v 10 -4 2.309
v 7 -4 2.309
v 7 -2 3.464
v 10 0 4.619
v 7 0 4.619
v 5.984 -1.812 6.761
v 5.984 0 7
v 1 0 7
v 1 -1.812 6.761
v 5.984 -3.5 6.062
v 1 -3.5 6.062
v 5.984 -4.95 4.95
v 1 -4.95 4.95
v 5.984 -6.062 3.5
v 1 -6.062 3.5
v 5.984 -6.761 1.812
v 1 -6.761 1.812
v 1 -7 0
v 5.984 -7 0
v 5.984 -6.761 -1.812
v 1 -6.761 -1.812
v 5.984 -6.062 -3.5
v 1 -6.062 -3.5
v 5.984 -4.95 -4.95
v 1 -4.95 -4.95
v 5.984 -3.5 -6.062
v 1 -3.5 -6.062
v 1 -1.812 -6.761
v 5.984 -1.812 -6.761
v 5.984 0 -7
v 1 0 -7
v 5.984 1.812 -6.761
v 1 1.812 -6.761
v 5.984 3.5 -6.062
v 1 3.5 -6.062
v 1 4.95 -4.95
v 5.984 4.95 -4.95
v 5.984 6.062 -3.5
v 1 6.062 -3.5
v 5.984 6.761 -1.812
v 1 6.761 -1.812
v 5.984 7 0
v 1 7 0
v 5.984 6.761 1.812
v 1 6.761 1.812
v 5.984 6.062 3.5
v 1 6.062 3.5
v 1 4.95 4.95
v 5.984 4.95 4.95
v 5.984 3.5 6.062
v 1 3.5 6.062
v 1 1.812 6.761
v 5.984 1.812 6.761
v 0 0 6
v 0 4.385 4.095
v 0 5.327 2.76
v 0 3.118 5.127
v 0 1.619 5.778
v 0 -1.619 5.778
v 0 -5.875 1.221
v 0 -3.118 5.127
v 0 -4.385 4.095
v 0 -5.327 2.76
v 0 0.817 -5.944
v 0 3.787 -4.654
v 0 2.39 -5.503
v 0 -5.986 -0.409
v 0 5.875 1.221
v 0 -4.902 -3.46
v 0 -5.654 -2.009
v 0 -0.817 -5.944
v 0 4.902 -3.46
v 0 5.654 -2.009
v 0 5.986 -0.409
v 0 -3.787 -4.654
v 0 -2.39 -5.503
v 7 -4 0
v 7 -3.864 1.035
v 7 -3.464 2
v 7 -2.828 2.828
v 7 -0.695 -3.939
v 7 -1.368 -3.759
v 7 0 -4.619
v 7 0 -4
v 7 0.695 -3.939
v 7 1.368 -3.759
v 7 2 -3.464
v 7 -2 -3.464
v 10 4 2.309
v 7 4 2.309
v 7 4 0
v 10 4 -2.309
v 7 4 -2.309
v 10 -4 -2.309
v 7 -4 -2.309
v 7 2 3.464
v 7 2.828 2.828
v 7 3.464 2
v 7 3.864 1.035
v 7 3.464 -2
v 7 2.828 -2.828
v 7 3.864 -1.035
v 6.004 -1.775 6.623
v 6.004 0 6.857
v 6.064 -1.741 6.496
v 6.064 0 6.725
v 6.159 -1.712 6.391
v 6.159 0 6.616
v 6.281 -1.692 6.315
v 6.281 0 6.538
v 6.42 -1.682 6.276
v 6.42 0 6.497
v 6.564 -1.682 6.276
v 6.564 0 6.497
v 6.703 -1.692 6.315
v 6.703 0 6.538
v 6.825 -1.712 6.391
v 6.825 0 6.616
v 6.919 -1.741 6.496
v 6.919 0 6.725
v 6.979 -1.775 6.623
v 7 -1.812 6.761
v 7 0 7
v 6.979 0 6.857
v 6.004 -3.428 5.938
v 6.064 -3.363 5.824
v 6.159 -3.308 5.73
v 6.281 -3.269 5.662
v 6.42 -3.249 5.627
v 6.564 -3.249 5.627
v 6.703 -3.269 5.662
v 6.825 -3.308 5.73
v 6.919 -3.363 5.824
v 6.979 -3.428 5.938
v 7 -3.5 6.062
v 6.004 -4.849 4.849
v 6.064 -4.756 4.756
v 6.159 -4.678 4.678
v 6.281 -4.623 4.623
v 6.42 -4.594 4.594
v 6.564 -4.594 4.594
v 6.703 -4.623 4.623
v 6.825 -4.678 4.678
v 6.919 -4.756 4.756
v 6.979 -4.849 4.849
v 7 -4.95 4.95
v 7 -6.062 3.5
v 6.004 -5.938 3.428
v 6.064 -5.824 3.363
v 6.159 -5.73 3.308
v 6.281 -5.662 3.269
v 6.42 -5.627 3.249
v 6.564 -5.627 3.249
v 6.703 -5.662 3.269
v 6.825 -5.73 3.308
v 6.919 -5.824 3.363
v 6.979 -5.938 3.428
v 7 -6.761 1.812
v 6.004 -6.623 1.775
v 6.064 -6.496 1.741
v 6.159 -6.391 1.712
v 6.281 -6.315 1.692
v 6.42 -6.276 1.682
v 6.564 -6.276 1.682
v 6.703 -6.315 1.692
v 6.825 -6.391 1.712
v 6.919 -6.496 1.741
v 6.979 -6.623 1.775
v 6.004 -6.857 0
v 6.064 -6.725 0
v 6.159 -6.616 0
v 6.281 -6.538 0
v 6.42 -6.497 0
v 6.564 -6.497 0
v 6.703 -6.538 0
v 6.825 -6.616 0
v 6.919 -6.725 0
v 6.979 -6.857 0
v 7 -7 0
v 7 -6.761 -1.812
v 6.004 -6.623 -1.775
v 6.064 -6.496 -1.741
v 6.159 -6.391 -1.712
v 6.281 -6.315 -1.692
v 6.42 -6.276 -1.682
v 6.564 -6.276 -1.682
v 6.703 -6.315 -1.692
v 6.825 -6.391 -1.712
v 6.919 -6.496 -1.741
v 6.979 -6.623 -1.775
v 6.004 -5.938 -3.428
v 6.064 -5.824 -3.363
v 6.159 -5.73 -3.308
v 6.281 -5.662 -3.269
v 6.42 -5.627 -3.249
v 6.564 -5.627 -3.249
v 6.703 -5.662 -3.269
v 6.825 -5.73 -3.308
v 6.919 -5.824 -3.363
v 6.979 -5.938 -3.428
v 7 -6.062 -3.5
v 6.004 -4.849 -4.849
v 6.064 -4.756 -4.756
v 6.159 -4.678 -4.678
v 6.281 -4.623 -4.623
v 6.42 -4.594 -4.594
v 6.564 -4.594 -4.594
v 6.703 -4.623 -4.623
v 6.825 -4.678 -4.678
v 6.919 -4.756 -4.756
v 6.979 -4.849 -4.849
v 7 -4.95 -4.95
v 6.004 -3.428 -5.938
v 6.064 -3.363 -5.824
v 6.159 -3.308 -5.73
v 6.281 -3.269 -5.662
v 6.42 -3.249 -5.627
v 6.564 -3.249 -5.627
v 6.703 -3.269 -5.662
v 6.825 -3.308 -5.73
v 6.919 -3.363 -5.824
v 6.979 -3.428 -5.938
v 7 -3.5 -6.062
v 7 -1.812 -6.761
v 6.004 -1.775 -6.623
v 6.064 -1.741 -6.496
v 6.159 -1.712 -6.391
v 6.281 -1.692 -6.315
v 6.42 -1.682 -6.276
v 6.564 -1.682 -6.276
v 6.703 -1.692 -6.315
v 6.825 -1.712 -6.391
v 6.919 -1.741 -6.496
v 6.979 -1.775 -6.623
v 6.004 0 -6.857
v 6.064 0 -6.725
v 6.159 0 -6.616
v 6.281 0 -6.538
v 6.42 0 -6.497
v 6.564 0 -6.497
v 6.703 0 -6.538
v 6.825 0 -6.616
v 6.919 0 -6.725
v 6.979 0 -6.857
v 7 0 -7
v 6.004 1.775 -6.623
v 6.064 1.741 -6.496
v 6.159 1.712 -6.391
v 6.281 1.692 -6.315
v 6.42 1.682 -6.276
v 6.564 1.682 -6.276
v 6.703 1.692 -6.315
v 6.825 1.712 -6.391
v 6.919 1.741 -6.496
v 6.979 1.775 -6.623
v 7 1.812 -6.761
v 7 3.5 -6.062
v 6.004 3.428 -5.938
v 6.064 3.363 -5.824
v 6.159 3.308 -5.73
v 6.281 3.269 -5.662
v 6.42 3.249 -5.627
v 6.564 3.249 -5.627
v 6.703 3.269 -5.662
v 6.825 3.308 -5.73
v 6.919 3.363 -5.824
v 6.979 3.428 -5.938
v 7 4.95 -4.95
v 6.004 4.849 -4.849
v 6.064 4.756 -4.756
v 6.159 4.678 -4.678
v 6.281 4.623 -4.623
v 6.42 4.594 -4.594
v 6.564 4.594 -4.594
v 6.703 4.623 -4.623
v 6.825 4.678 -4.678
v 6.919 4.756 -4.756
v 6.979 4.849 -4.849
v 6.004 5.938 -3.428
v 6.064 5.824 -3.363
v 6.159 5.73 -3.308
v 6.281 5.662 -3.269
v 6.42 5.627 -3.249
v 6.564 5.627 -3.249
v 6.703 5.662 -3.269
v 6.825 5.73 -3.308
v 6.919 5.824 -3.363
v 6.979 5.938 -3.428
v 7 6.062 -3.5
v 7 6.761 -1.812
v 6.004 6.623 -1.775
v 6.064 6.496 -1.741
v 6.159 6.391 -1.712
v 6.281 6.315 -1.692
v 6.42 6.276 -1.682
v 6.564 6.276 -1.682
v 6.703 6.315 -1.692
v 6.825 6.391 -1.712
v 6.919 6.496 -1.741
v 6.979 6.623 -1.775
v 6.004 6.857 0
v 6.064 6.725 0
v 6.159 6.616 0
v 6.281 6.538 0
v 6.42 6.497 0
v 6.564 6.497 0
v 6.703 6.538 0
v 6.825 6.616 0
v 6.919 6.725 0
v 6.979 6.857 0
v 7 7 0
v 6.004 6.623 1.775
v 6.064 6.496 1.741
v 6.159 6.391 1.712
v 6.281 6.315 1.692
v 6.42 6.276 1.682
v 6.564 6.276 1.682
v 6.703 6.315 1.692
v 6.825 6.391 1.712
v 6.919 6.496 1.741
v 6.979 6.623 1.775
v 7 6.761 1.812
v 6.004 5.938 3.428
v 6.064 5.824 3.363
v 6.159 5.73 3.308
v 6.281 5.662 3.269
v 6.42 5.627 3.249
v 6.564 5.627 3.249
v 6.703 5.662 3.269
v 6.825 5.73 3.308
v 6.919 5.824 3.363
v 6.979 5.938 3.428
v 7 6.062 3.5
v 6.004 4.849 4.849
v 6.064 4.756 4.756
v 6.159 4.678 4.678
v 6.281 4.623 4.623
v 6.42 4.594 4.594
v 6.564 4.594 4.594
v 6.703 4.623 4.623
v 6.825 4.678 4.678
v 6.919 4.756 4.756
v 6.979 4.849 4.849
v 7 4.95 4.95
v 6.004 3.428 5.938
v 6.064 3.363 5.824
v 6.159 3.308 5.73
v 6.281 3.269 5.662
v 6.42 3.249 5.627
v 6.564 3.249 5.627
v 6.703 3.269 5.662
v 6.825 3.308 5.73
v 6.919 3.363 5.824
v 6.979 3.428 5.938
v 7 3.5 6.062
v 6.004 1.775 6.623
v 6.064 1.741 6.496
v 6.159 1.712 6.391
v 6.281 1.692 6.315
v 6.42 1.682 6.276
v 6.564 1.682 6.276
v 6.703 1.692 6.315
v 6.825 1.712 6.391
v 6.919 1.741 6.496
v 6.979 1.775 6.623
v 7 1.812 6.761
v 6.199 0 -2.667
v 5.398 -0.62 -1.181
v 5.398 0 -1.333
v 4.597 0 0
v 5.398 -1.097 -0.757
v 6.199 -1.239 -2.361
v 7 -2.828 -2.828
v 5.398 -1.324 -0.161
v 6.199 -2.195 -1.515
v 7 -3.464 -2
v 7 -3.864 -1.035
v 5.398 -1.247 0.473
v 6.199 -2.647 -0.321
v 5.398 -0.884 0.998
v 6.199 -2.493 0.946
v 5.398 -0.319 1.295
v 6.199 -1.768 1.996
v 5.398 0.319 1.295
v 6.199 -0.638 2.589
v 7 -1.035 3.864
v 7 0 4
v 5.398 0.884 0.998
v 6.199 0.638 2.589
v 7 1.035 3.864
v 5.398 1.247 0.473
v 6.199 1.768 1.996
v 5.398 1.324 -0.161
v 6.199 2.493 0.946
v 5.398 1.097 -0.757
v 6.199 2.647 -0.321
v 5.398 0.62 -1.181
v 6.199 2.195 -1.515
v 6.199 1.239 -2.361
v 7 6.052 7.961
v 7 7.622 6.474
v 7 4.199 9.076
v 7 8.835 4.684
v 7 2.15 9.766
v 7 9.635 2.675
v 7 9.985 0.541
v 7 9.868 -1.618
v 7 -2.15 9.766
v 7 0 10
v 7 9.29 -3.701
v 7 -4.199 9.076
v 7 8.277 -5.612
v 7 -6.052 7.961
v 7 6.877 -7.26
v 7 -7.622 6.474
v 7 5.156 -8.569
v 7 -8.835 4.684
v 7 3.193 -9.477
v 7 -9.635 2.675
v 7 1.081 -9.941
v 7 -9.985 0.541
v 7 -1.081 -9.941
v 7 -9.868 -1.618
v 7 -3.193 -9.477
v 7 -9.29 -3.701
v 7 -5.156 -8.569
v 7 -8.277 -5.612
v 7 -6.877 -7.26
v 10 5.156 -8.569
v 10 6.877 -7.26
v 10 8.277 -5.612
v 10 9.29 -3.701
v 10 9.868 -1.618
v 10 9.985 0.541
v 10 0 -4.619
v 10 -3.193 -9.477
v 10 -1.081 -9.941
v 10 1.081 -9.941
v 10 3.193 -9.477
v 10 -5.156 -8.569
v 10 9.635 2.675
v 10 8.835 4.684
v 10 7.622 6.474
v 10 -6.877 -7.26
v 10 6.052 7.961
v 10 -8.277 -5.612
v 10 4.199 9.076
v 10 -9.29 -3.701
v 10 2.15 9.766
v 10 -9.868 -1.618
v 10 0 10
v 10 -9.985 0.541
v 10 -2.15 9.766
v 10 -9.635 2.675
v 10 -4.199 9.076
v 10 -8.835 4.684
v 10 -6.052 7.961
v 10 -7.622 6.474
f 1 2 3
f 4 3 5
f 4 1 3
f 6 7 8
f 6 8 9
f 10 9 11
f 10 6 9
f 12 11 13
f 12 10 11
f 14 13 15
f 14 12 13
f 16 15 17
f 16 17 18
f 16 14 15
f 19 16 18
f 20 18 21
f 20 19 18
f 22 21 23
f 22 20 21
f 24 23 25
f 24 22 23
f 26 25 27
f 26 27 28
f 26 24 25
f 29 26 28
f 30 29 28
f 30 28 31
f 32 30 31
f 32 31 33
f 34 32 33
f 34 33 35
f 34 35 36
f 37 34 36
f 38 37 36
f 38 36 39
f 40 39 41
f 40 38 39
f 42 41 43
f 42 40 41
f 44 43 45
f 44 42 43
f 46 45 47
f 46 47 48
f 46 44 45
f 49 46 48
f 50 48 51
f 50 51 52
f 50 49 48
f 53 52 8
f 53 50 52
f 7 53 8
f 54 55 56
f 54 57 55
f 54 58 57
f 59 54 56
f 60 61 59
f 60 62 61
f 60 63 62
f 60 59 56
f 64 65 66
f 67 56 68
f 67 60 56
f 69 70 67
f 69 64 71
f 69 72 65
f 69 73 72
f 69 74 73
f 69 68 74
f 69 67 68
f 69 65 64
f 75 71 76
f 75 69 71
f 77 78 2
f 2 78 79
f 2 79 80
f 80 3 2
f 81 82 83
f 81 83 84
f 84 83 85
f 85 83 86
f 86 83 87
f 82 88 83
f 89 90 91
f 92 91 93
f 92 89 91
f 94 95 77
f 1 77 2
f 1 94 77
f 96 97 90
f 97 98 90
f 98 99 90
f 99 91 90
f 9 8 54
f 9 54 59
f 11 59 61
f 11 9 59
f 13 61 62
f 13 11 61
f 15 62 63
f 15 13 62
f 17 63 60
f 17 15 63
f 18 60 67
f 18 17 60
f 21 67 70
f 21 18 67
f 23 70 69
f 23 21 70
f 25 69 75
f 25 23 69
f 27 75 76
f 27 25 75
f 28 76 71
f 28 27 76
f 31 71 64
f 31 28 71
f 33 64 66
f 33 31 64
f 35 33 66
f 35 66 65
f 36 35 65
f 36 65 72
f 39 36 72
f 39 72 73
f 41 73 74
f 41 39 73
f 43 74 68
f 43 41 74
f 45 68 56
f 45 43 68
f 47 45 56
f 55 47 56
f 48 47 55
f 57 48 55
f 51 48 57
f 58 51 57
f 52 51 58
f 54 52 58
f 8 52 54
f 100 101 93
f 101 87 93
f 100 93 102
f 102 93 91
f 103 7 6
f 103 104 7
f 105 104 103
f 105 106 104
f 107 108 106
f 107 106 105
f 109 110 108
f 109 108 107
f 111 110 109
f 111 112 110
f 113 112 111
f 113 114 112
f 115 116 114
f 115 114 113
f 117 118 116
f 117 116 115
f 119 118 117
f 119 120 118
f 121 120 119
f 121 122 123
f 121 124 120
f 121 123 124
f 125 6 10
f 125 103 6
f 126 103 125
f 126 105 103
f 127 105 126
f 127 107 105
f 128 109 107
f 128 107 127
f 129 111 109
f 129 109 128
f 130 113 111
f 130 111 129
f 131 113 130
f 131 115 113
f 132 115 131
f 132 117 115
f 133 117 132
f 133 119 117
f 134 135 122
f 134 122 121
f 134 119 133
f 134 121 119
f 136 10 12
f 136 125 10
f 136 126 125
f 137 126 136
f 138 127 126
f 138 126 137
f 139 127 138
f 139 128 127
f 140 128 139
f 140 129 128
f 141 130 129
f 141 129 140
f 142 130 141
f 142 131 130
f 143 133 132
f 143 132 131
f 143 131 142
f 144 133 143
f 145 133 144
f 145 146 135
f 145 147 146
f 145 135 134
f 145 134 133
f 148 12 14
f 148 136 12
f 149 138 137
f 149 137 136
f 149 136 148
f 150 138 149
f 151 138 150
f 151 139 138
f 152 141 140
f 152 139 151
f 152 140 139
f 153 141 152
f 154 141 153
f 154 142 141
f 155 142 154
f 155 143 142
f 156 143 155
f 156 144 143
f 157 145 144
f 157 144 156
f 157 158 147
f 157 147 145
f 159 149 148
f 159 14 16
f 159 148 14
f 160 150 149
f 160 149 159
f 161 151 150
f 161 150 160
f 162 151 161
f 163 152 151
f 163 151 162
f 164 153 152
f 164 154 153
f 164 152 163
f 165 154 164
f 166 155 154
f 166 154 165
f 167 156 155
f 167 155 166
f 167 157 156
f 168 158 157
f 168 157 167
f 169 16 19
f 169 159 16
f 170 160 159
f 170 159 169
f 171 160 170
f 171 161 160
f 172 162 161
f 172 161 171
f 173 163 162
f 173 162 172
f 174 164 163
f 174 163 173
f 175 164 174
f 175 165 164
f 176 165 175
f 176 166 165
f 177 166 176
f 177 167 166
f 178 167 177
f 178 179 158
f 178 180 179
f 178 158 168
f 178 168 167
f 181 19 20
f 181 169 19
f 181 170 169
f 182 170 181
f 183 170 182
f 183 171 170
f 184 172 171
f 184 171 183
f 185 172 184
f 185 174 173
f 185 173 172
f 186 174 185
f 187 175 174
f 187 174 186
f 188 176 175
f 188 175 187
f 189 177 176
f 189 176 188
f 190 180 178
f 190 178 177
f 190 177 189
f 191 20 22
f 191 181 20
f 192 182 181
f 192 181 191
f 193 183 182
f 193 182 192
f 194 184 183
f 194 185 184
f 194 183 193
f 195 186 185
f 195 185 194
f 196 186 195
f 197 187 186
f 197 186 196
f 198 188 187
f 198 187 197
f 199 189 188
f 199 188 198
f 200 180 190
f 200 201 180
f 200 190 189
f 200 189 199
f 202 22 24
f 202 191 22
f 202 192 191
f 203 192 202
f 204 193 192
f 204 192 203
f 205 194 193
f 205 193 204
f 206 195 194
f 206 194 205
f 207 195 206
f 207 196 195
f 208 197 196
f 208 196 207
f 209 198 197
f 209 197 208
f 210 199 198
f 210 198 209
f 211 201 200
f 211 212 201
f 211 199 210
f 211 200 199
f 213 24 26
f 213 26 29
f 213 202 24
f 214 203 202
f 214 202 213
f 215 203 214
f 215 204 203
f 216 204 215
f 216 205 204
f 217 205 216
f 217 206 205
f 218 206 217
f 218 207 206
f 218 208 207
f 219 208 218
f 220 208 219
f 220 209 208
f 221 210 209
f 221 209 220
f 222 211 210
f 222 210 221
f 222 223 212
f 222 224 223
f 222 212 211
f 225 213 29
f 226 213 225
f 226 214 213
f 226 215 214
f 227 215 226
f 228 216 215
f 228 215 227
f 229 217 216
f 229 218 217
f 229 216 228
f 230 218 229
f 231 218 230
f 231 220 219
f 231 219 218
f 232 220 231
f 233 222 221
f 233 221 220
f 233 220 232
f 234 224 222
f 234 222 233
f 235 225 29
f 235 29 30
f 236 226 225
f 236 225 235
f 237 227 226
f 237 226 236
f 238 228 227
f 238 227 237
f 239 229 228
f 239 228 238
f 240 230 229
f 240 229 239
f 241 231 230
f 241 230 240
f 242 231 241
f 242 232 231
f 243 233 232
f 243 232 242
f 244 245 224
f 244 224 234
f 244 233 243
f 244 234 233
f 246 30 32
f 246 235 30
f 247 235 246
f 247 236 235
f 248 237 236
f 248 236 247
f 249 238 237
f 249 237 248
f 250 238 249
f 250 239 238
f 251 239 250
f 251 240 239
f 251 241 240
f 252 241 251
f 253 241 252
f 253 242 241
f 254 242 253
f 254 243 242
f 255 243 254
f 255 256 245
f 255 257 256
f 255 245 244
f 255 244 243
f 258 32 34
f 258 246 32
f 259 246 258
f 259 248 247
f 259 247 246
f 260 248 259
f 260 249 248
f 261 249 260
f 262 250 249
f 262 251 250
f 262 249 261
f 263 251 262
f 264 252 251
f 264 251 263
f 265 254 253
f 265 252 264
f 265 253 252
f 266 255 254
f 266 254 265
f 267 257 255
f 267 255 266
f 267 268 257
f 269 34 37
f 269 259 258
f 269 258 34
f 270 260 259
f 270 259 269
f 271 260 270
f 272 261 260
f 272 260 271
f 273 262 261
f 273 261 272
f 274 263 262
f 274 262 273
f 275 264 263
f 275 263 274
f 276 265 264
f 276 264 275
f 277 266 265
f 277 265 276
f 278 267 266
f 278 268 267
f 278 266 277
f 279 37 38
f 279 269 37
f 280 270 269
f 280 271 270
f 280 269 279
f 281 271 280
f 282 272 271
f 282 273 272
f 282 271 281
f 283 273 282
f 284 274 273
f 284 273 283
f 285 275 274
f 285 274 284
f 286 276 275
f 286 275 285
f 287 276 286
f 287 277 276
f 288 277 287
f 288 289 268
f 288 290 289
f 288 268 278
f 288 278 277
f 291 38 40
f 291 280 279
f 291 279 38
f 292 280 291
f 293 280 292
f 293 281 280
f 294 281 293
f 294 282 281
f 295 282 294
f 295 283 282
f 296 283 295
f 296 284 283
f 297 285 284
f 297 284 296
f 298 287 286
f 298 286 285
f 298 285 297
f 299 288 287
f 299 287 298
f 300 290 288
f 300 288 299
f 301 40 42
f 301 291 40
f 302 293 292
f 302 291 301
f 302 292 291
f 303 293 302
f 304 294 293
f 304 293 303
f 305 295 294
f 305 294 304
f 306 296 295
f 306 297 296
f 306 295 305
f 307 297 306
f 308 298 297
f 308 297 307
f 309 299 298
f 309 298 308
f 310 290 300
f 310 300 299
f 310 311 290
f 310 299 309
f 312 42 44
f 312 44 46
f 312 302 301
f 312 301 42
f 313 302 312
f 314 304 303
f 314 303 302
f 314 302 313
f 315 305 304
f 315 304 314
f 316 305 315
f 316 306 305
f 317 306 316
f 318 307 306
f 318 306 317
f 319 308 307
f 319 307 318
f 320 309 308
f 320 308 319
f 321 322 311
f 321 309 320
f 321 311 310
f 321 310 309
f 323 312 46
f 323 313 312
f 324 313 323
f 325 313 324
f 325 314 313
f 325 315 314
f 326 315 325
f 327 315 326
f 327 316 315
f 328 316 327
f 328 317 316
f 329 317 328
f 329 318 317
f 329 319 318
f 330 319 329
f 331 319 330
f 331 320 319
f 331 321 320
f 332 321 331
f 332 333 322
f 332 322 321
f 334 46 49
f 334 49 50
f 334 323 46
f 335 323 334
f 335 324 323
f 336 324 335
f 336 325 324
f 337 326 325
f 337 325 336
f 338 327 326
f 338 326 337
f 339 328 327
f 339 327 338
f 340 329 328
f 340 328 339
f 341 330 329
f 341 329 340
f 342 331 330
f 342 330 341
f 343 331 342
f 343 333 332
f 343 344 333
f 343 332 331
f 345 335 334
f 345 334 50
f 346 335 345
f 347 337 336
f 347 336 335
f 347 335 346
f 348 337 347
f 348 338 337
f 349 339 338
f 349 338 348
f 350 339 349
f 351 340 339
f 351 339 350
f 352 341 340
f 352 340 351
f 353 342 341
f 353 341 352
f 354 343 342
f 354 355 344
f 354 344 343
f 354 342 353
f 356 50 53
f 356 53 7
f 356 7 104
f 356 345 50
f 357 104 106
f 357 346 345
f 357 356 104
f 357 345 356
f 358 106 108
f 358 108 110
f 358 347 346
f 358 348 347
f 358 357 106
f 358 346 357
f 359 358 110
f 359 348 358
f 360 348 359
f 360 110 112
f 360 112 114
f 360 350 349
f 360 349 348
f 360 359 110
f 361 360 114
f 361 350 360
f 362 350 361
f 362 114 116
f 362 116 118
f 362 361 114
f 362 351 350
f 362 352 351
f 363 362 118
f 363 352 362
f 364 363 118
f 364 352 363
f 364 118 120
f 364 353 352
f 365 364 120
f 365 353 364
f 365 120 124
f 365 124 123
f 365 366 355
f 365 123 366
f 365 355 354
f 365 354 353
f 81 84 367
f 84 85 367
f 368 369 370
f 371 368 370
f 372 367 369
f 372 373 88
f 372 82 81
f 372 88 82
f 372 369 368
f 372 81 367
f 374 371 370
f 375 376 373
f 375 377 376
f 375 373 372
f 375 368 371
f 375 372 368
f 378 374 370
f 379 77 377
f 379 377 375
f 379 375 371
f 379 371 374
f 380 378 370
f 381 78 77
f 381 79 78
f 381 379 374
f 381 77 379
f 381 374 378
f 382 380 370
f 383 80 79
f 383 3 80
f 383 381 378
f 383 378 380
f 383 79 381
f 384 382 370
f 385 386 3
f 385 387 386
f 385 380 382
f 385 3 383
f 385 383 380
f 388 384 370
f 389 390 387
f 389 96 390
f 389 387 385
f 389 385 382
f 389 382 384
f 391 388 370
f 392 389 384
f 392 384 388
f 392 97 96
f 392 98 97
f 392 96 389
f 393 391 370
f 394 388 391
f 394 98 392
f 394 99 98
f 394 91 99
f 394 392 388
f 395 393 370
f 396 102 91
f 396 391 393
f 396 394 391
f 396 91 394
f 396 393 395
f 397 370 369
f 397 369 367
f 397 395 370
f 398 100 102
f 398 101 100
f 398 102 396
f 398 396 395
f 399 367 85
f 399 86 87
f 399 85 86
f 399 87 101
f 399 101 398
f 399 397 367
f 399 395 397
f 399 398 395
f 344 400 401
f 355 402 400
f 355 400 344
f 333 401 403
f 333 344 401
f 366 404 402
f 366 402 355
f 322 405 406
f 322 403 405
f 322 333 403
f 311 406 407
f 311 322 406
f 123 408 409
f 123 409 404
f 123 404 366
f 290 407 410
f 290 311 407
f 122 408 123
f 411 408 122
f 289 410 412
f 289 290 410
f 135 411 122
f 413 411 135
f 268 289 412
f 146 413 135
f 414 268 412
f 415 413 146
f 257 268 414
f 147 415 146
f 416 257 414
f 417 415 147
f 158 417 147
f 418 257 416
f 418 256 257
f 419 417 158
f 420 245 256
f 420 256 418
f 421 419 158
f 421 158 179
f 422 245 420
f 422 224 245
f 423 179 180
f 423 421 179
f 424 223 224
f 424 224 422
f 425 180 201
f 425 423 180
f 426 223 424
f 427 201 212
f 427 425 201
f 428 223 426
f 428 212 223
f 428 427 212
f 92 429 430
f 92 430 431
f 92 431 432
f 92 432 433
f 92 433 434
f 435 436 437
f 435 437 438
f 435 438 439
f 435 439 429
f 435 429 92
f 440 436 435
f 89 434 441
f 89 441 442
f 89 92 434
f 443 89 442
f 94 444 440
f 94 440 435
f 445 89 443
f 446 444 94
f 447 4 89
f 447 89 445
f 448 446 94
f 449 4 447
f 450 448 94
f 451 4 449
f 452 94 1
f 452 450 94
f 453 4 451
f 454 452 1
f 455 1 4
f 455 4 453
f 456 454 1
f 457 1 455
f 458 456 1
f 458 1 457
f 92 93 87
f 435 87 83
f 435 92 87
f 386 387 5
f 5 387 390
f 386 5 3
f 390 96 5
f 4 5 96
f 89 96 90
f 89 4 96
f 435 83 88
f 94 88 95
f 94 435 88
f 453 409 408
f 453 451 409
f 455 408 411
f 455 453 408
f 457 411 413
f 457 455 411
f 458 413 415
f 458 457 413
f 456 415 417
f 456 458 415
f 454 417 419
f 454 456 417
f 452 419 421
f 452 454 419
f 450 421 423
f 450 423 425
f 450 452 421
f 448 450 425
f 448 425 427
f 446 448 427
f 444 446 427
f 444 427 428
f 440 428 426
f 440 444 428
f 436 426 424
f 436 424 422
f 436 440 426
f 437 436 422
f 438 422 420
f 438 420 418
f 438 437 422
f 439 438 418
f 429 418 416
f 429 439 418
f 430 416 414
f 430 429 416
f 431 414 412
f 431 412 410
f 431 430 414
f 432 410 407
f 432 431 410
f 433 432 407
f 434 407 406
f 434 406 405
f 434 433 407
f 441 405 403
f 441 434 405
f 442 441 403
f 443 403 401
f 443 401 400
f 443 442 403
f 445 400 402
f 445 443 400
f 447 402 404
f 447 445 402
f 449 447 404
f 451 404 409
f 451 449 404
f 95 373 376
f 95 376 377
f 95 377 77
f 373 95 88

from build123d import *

# Parameters (mm, degrees)
ENL_V_MAT_EXTRU_1_DEPTH = 3
CHANFREIN1_SIZE         = 1


with BuildPart() as part:
    # Esquisse1 → Révolution1 (revolve)
    with BuildSketch(Plane.XY, mode=Mode.PRIVATE) as r_volution1_sk:
        with BuildLine():
            Line((0, 0), (0, 7))
            Line((0, 7), (5.983785808, 7))
            ThreePointArc((5.983785808, 7), (6.491892904, 6.491892904), (7, 7))
            Line((7, 7), (7, 10))
            Line((7, 10), (10, 10))
            Line((10, 10), (10, 0))
            Line((10, 0), (0, 0))
        make_face()
    revolve(r_volution1_sk.sketch.rotate(Axis((0, 0, 0), (1, 0, 0)), 90), axis=Axis((0, 0, 0), (1, 0, 0)))

    # Esquisse5 → Diamètre du perçage Ø8.0 (8)1 (revolve, cut)
    with BuildSketch(Plane(origin=(10, 0, 0), x_dir=(0, 0, -1), z_dir=(0, 1, 0))):
        Polygon((0, 0), (0, 5.403442476), (4, 3), (4, 0), align=None)
    revolve(axis=Axis((16.35, 0, 0), (-1, 0, 0)), mode=Mode.SUBTRACT)

    # Esquisse3 → Enlèv. mat.-Extru.1 (cut)
    with BuildSketch(Plane(origin=(10, 0, 0), x_dir=(0, 0, -1), z_dir=(1, 0, 0))):
        Polygon((-4.618802154, 0), (-2.309401077, 4), (2.309401077, 4), (4.618802154, 0), (2.309401077, -4), (-2.309401077, -4), align=None)
    extrude(amount=-ENL_V_MAT_EXTRU_1_DEPTH, mode=Mode.SUBTRACT)

    # Chanfrein1
    chanfrein1_edges = [part.edges().sort_by_distance(p)[0] for p in [
        (0, 0, -7),
    ]]
    chamfer(chanfrein1_edges, length=CHANFREIN1_SIZE)


solid = part.part
